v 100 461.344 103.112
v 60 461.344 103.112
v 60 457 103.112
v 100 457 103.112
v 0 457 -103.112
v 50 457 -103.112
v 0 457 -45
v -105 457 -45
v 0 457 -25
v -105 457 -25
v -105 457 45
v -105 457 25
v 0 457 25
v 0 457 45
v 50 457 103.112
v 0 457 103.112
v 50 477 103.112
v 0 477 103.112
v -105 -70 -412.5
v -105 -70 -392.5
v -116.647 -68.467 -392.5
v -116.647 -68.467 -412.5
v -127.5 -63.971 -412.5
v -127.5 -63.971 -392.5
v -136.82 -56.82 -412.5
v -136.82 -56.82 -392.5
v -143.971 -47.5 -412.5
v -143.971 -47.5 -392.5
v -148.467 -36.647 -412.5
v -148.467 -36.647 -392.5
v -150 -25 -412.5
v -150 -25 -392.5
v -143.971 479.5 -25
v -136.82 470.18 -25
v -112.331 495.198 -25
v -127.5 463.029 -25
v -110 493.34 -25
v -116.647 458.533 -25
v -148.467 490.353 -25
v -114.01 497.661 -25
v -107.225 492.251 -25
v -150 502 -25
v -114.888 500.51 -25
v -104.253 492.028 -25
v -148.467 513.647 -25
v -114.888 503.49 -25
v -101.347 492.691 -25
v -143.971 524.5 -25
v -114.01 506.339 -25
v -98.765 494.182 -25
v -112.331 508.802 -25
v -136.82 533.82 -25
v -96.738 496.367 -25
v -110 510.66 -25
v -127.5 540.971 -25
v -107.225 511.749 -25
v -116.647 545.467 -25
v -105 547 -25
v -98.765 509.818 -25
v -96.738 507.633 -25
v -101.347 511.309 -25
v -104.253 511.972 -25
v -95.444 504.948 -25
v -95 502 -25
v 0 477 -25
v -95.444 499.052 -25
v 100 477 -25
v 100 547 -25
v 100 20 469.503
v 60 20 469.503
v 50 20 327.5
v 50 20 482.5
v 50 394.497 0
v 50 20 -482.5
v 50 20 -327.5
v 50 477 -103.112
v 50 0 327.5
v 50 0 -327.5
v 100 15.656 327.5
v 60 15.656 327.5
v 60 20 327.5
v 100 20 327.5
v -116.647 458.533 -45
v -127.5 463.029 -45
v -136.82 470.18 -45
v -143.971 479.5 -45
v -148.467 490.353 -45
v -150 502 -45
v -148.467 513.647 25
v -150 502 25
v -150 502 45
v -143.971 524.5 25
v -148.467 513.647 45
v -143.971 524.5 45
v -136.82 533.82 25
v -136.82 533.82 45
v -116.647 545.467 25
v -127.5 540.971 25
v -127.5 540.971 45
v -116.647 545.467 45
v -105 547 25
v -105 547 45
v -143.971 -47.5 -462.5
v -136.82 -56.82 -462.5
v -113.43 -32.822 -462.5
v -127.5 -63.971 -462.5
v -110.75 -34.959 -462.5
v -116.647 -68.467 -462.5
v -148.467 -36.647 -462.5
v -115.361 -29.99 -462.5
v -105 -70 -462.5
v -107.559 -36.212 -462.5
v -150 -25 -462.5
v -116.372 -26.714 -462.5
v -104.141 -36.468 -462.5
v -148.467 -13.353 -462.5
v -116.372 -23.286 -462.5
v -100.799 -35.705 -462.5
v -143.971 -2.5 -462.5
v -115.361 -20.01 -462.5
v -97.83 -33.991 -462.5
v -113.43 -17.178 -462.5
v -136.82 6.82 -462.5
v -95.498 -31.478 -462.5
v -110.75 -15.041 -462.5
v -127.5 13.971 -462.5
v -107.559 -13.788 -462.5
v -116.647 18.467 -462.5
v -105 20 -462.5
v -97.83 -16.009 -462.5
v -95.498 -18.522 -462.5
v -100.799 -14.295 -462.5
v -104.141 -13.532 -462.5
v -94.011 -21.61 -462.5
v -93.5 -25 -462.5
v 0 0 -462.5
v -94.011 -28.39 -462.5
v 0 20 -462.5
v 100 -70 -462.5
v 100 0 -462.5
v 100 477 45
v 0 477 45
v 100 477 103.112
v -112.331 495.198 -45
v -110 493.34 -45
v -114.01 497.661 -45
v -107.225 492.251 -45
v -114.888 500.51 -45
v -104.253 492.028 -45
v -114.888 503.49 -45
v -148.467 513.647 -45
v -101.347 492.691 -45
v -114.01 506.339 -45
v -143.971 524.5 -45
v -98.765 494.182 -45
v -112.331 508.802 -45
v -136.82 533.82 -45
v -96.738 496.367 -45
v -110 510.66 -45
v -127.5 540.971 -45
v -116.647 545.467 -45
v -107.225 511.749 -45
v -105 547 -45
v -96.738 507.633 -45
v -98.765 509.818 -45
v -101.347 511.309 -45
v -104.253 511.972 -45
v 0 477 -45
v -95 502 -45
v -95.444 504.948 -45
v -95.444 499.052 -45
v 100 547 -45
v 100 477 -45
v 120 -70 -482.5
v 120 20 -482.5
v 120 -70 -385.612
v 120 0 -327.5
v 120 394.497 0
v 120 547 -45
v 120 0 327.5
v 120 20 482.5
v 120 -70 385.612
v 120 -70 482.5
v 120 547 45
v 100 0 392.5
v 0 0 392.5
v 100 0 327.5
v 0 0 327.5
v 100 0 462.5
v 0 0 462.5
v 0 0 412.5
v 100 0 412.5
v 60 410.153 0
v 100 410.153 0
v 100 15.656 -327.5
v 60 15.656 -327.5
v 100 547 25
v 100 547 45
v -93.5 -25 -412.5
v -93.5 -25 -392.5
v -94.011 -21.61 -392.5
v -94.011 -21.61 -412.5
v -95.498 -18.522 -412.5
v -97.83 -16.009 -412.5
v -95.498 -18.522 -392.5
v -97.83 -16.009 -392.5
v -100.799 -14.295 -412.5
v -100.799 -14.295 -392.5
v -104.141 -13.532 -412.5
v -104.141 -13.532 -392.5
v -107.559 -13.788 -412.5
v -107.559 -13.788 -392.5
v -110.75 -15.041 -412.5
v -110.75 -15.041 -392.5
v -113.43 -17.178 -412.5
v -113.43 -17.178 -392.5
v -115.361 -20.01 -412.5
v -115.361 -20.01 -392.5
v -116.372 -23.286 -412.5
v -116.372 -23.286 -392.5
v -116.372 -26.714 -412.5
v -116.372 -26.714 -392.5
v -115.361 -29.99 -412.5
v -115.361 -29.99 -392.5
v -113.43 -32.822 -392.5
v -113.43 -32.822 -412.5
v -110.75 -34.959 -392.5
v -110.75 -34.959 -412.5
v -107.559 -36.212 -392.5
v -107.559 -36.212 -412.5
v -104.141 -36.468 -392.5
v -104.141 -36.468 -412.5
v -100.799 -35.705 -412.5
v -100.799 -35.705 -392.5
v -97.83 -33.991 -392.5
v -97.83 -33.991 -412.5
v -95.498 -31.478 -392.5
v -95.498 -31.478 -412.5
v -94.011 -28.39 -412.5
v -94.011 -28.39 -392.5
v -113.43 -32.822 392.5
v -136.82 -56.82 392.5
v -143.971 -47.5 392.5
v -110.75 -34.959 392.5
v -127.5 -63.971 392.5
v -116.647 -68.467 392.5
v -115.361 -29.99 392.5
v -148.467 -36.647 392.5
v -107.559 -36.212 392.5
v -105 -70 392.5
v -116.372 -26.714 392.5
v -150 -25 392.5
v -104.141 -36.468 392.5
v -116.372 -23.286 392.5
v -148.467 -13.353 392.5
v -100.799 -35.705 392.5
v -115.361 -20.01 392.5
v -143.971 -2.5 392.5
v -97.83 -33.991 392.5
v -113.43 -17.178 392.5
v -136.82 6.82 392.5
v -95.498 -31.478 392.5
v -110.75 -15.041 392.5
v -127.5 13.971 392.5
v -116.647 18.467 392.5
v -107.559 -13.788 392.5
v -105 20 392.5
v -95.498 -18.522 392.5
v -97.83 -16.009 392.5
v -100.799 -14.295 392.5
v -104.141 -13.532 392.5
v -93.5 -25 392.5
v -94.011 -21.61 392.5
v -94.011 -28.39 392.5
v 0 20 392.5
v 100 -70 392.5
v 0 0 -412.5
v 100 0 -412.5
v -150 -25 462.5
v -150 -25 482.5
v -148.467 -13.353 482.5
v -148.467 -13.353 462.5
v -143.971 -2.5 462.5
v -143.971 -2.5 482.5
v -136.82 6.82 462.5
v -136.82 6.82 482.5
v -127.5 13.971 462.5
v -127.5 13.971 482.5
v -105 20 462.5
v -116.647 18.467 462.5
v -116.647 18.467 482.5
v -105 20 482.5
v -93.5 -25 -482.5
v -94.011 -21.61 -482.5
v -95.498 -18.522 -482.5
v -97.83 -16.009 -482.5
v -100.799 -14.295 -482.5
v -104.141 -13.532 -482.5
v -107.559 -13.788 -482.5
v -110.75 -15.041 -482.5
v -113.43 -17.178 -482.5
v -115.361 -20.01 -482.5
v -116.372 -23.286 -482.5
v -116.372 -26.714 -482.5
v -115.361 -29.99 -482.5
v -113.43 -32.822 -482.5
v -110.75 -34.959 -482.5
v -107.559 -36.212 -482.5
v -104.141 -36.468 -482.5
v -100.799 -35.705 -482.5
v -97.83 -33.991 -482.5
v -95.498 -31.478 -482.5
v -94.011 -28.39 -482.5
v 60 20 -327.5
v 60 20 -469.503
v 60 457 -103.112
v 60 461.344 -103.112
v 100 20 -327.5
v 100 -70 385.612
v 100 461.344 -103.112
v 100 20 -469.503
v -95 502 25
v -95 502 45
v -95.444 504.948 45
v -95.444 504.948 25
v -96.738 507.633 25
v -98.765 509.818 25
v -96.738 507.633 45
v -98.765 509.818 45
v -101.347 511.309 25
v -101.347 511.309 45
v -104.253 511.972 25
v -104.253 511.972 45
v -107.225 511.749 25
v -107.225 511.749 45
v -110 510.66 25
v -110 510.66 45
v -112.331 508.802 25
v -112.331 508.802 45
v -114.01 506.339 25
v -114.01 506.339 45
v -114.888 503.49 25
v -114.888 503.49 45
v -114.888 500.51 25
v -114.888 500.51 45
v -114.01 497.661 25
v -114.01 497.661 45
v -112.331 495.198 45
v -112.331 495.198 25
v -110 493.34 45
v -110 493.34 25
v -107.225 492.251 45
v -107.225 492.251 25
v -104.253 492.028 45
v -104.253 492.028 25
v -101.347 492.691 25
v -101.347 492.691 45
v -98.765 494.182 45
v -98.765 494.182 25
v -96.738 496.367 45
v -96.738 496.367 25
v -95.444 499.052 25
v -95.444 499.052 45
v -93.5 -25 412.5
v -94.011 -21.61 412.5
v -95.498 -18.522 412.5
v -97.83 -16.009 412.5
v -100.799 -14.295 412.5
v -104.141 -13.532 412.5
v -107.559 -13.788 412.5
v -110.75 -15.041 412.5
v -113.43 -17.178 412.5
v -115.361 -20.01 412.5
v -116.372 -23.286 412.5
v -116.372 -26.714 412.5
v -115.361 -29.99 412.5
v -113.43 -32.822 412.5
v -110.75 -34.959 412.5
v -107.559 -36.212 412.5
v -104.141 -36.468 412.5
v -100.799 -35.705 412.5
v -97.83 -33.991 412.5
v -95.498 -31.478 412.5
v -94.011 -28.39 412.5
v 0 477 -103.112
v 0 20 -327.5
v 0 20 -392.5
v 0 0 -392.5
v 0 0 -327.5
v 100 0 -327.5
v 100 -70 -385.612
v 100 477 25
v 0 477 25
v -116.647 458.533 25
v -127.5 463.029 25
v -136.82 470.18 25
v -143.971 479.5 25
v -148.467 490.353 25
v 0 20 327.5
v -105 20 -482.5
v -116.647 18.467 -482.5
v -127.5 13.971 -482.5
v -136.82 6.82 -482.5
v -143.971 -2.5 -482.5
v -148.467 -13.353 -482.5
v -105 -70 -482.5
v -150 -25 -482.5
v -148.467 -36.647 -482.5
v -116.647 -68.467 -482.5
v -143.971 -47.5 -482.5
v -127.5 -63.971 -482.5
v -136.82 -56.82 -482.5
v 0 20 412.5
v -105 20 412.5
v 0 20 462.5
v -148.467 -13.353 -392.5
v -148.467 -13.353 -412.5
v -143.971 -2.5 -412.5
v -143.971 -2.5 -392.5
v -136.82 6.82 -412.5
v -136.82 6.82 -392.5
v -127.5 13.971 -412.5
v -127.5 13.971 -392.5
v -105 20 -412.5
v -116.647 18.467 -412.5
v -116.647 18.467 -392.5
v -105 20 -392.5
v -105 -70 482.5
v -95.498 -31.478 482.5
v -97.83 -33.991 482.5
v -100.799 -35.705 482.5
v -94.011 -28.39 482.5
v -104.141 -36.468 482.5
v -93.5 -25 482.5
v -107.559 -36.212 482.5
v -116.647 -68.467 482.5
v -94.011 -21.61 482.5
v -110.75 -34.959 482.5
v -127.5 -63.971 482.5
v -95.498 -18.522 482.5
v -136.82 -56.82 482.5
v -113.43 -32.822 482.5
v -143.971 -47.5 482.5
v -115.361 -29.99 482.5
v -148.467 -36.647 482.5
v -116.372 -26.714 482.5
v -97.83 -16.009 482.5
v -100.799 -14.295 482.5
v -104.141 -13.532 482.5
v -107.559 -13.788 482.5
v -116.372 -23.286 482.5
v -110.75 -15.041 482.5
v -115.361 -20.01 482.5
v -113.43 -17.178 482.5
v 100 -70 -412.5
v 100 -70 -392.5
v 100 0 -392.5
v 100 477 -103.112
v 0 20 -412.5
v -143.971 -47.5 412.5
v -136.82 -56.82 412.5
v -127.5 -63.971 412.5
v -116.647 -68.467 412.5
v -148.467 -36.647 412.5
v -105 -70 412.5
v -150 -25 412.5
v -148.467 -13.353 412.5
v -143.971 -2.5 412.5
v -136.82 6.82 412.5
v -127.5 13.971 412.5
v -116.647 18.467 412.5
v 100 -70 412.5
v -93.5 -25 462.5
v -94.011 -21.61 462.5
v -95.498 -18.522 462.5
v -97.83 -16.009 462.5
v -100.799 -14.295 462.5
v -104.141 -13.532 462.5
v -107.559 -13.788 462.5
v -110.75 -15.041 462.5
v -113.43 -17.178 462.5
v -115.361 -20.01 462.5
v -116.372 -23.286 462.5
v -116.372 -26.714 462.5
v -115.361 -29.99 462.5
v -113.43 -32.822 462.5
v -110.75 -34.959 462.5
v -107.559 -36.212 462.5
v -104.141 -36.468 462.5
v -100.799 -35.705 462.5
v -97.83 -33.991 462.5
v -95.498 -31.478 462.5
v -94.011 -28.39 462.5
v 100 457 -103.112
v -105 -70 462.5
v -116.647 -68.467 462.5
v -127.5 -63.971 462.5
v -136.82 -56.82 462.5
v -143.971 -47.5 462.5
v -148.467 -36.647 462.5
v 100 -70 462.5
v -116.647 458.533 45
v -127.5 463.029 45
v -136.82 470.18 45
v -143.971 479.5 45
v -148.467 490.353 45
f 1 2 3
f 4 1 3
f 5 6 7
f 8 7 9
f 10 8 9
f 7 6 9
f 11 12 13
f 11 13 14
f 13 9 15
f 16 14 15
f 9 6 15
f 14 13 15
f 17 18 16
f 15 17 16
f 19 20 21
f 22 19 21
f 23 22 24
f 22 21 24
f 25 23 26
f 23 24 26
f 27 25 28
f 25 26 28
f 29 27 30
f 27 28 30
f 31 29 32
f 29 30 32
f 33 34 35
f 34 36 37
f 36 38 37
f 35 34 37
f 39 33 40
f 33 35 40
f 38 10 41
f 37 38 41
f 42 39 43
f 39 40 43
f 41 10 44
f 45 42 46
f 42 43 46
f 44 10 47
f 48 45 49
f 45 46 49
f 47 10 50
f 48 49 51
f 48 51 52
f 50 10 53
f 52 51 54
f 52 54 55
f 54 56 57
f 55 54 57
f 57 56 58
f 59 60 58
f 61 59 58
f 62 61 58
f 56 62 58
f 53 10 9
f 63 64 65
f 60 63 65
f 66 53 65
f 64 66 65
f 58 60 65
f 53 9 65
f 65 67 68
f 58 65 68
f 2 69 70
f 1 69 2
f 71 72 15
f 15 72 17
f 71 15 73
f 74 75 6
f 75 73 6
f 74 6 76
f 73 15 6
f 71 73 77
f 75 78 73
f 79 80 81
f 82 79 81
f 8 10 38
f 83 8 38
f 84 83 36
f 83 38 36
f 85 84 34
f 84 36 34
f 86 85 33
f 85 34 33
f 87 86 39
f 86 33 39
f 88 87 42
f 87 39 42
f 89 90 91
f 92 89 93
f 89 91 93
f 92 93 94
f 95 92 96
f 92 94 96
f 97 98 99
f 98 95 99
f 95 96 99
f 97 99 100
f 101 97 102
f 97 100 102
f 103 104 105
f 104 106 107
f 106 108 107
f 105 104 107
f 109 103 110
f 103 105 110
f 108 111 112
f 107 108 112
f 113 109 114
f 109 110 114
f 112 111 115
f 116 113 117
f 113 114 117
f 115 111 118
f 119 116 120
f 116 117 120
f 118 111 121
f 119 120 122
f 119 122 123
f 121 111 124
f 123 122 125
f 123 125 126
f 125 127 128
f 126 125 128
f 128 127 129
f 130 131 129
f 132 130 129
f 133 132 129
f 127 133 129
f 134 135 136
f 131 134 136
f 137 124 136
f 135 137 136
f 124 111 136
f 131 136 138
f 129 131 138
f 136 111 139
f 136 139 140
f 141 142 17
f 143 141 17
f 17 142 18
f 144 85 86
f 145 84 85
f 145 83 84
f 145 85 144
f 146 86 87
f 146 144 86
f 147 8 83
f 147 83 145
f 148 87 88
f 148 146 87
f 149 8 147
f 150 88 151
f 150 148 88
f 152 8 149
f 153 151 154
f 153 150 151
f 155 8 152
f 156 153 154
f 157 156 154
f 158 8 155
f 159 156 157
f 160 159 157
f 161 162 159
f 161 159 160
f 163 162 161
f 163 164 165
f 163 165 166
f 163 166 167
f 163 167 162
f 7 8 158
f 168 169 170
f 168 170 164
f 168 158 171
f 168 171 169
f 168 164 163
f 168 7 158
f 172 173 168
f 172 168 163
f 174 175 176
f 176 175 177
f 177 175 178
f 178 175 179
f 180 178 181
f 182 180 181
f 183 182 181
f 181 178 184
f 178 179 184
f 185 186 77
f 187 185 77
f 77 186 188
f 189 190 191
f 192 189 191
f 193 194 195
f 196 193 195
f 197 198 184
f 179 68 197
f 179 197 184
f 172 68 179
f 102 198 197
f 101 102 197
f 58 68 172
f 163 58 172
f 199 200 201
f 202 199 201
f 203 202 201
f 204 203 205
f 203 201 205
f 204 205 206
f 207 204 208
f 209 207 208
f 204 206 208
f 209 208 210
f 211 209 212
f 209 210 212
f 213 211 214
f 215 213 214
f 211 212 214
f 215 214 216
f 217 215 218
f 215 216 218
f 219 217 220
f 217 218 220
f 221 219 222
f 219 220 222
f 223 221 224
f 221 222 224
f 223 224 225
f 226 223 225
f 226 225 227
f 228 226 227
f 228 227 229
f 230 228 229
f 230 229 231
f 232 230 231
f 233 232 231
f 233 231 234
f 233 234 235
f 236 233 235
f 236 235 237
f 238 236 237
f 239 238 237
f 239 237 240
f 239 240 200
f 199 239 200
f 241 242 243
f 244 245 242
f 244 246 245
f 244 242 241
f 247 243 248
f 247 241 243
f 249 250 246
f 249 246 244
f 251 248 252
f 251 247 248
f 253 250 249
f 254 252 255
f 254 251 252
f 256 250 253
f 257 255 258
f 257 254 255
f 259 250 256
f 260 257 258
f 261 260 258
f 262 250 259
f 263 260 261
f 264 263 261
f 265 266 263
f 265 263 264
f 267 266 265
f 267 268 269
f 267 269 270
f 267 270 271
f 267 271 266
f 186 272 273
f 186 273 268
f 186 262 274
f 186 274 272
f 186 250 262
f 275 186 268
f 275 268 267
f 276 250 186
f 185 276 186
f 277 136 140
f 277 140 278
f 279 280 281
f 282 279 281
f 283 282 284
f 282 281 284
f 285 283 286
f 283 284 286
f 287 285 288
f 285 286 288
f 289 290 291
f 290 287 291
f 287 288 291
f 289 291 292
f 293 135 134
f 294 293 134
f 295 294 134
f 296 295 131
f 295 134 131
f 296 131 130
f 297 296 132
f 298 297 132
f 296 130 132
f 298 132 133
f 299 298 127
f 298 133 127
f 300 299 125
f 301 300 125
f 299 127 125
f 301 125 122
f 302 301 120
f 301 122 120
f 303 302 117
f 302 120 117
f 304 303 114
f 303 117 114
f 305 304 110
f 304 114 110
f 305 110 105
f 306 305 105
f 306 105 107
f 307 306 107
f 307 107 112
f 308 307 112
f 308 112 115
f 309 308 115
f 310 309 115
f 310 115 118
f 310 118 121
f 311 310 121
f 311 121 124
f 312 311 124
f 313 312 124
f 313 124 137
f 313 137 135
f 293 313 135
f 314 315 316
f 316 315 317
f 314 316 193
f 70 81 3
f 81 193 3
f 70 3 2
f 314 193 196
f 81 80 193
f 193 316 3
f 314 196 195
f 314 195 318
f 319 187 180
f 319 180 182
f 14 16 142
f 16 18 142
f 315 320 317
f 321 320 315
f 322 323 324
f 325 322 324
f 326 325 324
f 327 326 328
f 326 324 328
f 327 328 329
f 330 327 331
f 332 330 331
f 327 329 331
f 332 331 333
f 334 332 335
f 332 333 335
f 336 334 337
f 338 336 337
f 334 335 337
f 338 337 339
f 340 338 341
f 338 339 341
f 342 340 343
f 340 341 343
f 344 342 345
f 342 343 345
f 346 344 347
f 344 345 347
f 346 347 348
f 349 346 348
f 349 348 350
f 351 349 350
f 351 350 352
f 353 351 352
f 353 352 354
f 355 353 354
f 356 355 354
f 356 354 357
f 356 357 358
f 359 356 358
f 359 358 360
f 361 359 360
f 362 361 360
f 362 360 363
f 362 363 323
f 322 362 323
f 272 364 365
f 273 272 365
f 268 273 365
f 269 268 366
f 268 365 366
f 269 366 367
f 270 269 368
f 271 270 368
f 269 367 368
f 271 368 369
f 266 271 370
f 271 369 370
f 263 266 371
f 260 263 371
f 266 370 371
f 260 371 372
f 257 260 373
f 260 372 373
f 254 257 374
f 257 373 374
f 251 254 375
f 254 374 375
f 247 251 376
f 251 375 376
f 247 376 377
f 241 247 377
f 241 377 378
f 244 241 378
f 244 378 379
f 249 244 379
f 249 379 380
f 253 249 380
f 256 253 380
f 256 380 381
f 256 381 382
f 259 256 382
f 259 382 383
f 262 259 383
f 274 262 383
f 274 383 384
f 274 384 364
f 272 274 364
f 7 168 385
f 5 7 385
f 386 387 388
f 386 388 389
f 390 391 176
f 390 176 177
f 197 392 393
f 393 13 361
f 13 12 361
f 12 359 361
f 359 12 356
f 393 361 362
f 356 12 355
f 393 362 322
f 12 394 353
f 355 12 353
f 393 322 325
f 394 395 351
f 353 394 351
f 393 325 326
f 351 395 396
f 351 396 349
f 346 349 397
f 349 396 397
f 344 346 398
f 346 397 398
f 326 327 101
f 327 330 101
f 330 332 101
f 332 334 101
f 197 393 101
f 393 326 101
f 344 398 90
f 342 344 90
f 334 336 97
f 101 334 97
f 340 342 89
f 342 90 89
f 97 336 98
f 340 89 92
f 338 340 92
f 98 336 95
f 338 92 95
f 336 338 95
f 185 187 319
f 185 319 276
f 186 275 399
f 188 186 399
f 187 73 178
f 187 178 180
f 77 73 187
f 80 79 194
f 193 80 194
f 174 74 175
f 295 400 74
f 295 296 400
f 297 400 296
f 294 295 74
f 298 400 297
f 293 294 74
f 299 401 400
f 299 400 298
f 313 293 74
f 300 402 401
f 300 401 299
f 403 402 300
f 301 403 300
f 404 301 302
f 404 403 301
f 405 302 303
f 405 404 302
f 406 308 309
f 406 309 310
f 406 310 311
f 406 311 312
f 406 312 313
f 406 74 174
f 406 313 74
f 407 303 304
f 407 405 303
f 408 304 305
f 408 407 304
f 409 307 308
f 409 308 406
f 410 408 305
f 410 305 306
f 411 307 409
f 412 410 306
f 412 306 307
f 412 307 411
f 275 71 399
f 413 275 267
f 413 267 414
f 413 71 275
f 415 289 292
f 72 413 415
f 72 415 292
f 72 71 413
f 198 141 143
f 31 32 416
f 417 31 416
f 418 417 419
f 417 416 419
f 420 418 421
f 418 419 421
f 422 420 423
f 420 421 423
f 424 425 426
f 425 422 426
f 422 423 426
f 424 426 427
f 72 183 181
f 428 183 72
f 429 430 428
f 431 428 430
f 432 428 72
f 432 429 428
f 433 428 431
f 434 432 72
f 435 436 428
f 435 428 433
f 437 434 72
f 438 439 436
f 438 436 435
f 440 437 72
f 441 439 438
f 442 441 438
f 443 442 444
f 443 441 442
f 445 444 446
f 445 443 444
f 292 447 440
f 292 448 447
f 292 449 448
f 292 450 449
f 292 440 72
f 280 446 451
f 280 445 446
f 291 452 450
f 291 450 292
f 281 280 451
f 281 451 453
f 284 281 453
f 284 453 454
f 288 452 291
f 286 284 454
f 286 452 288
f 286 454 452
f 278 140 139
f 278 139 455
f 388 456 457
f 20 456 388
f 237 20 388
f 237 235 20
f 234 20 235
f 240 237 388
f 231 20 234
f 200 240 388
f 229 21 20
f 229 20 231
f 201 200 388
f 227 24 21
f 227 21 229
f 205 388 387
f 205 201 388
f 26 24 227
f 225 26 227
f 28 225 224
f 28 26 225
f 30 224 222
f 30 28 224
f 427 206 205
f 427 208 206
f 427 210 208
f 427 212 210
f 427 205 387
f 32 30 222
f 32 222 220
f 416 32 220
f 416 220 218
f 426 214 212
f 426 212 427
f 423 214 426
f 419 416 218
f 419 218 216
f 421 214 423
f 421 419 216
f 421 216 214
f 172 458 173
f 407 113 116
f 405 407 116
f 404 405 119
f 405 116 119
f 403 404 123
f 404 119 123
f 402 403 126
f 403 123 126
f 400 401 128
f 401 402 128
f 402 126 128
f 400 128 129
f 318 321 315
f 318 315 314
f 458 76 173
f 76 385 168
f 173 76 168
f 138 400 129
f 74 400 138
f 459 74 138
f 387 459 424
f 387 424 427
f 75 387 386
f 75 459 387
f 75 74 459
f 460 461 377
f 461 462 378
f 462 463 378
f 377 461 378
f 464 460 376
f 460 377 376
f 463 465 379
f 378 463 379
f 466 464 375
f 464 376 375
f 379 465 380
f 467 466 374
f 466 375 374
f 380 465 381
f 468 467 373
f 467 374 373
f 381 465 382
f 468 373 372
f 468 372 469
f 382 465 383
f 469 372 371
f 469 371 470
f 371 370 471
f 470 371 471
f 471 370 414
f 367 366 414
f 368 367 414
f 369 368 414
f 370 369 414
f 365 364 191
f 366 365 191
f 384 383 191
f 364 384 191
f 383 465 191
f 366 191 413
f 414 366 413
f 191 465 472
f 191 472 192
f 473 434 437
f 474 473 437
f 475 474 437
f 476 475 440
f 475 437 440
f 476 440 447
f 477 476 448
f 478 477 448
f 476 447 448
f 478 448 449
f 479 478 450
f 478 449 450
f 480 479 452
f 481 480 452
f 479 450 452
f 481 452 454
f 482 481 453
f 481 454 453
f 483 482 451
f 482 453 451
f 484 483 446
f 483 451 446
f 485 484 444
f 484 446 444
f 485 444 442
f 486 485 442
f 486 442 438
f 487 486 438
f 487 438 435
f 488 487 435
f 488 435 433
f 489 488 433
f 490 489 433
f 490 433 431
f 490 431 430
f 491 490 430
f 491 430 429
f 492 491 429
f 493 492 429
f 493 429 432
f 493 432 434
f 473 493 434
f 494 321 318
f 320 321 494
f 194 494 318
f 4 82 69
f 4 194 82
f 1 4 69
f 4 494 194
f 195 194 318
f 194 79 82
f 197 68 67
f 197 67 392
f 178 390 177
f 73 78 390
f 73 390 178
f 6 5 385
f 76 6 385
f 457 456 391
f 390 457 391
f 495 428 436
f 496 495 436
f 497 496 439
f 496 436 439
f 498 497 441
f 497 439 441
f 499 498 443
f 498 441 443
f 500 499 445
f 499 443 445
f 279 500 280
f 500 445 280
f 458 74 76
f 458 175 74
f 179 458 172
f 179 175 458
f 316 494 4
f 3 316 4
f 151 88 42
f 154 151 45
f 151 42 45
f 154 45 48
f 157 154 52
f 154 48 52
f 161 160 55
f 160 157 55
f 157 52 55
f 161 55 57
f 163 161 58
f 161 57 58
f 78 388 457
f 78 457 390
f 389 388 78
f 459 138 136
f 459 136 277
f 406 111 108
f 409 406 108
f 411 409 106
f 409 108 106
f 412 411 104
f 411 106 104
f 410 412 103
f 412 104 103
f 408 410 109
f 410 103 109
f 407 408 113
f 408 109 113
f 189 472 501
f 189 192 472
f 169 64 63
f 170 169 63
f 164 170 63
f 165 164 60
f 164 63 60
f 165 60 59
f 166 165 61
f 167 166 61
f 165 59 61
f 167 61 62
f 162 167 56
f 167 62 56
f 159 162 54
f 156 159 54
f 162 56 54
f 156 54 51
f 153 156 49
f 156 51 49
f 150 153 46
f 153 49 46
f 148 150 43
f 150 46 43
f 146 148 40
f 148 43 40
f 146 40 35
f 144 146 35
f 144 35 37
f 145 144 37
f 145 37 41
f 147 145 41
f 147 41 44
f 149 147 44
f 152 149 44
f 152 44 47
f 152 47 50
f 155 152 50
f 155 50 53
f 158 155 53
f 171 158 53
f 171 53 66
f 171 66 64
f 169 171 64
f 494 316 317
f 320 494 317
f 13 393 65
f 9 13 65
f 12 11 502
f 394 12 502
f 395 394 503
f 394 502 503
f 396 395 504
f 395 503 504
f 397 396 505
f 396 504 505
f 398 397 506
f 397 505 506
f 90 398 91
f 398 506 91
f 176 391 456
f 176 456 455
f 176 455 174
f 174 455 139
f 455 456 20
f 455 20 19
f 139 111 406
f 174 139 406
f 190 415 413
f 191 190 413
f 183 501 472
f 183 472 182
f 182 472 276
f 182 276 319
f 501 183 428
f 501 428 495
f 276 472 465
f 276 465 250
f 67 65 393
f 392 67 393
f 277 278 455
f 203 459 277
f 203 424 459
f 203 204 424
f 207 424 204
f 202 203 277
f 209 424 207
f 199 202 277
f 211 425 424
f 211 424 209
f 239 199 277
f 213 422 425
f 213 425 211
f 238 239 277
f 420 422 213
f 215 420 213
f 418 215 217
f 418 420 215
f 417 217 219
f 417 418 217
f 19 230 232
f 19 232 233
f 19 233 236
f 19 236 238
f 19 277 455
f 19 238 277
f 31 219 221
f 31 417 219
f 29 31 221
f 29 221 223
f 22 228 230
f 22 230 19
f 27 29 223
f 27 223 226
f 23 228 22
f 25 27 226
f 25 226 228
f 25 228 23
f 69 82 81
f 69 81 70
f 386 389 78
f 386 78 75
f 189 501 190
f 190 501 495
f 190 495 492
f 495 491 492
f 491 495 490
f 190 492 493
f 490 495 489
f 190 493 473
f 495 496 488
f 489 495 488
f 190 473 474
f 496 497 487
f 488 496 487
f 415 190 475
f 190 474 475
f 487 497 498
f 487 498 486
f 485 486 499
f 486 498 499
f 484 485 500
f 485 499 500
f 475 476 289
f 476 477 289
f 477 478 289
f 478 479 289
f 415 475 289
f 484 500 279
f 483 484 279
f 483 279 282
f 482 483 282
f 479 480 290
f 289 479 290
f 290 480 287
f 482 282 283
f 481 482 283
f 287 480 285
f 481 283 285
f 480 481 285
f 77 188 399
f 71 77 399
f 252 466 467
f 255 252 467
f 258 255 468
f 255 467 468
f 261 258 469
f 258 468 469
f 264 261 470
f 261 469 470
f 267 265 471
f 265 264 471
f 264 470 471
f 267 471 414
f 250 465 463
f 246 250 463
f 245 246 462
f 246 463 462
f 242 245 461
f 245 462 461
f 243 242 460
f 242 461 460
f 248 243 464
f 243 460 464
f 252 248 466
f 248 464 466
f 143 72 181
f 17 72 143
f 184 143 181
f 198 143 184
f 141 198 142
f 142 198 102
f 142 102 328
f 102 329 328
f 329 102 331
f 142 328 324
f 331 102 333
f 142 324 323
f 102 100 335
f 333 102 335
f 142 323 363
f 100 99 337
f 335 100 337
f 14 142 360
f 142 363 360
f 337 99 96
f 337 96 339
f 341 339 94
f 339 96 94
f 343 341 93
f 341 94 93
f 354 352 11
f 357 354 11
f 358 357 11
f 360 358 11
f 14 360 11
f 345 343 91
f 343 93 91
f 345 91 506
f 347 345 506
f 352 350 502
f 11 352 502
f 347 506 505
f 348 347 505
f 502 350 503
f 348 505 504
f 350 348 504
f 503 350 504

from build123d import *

# Parameters (mm, degrees)
BOSS_EXTRUDE1_DEPTH     = 100
BOSS_EXTRUDE1_2_DEPTH   = 100
BOSS_EXTRUDE1_3_DEPTH   = 100
SKETCH2_W               = 20
SKETCH2_H               = 90
BOSS_EXTRUDE2_DEPTH     = 150
BOSS_EXTRUDE3_DEPTH     = 20
SKETCH4_R               = 11.5
SKETCH4_R_2             = 10
CUT_EXTRUDE2_DEPTH      = 1
CUT_EXTRUDE2_DEPTH_BACK = 966
BOSS_EXTRUDE4_DEPTH     = 50
BOSS_EXTRUDE5_DEPTH     = 10


with BuildPart() as part:
    # Sketch1 → Boss-Extrude1 (new body)
    with BuildSketch(Plane(origin=(0, 0, 0), x_dir=(0, 0, -1), z_dir=(1, 0, 0))):
        Polygon((-462.5, 0), (-412.5, 0), (-412.5, -70), (-392.5, -70), (-392.5, 0), (-327.5, 0), (-327.5, 20), (-482.5, 20), (-482.5, -70), (-462.5, -70), align=None)
    extrude(amount=BOSS_EXTRUDE1_DEPTH)



with BuildPart() as body_2:
    # Sketch1 → Boss-Extrude1 2 (new body)
    with BuildSketch(Plane(origin=(0, 0, 0), x_dir=(0, 0, -1), z_dir=(1, 0, 0))):
        Polygon((25, 477), (-25, 477), (-25, 547), (-45, 547), (-45, 477), (-103.111954459, 477), (-103.111954459, 457), (103.111954459, 457), (103.111954459, 477), (45, 477), (45, 547), (25, 547), align=None)
    extrude(amount=BOSS_EXTRUDE1_2_DEPTH)


with BuildPart() as body_3:
    # Sketch1 → Boss-Extrude1 3 (new body)
    with BuildSketch(Plane(origin=(0, 0, 0), x_dir=(0, 0, -1), z_dir=(1, 0, 0))):
        Polygon((392.5, 0), (327.5, 0), (327.5, 20), (482.5, 20), (482.5, -70), (462.5, -70), (462.5, 0), (412.5, 0), (412.5, -70), (392.5, -70), align=None)
    extrude(amount=BOSS_EXTRUDE1_3_DEPTH)


with BuildPart() as part_1:
    add(part.part)

    add(body_2.part)  # Boss-Extrude2 merges body 2

    add(body_3.part)  # Boss-Extrude2 merges body 3
    # Sketch2 → Boss-Extrude2 (add)
    with BuildSketch(Plane.ZY):
        with Locations((-472.5, -25)):
            Rectangle(SKETCH2_W, SKETCH2_H)
        with Locations((-402.5, -25)):
            Rectangle(SKETCH2_W, SKETCH2_H)
        with Locations((-35, 502)):
            Rectangle(SKETCH2_W, SKETCH2_H)
        with Locations((35, 502)):
            Rectangle(SKETCH2_W, SKETCH2_H)
        with Locations((402.5, -25)):
            Rectangle(SKETCH2_W, SKETCH2_H)
        with Locations((472.5, -25)):
            Rectangle(SKETCH2_W, SKETCH2_H)
    extrude(amount=BOSS_EXTRUDE2_DEPTH)

    # Sketch3 → Boss-Extrude3 (add)
    with BuildSketch(Plane(origin=(100, 0, 0), x_dir=(0, 0, -1), z_dir=(1, 0, 0))):
        Polygon((-482.5, -70), (-482.5, 20), (-45, 547), (45, 547), (482.5, 20), (482.5, -70), (392.5, -70), (385.611954459, -70), (327.5, 0), (0, 394.497142857), (-327.5, 0), (-385.611954459, -70), (-392.5, -70), align=None)
    extrude(amount=BOSS_EXTRUDE3_DEPTH)

    # Sketch4 → Cut-Extrude2 (cut, two sides)
    with BuildSketch(Plane.XY.offset(482.5)) as cut_extrude2_sk:
        with BuildLine():
            ThreePointArc((-150, -25), (-136.819805153, 6.819805153), (-105, 20))
            Line((-105, 20), (-150, 20))
            Line((-150, 20), (-150, -25))
        make_face()
        with Locations((-105, -25)):
            Circle(SKETCH4_R)
        with BuildLine():
            ThreePointArc((-105, -70), (-136.819805153, -56.819805153), (-150, -25))
            Line((-150, -25), (-150, -70))
            Line((-150, -70), (-105, -70))
        make_face()
        with Locations((-105, 502)):
            Circle(SKETCH4_R_2)
        with BuildLine():
            Line((-150, 547), (-150, 502))
            ThreePointArc((-150, 502), (-136.819805153, 533.819805153), (-105, 547))
            Line((-105, 547), (-150, 547))
        make_face()
        with BuildLine():
            Line((-150, 457), (-105, 457))
            ThreePointArc((-105, 457), (-136.819805153, 470.180194847), (-150, 502))
            Line((-150, 502), (-150, 457))
        make_face()
    extrude(amount=CUT_EXTRUDE2_DEPTH, mode=Mode.SUBTRACT)
    extrude(cut_extrude2_sk.sketch, amount=-CUT_EXTRUDE2_DEPTH_BACK, mode=Mode.SUBTRACT)

    # Sketch5 → Boss-Extrude4 (add)
    with BuildSketch(Plane.ZY.offset(-100)):
        Polygon((-482.5, 20), (-103.111954459, 477), (-103.111954459, 461.344354608), (-469.503140685, 20), align=None)
        Polygon((-327.5, 0), (0, 394.497142857), (327.5, 0), (327.5, 15.655645392), (0, 410.15278825), (-327.5, 15.655645392), align=None)
        Polygon((482.5, 20), (469.503140685, 20), (103.111954459, 461.344354608), (103.111954459, 477), align=None)
    extrude(amount=BOSS_EXTRUDE4_DEPTH)

    # Sketch8 → Boss-Extrude5 (add)
    with BuildSketch(Plane.ZY.offset(-50)):
        Polygon((-482.5, 20), (-327.5, 20), (-327.5, 0), (0, 394.497142857), (327.5, 0), (327.5, 20), (482.5, 20), (103.111954459, 477), (-103.111954459, 477), align=None)
    extrude(amount=-BOSS_EXTRUDE5_DEPTH)


solid = part_1.part
